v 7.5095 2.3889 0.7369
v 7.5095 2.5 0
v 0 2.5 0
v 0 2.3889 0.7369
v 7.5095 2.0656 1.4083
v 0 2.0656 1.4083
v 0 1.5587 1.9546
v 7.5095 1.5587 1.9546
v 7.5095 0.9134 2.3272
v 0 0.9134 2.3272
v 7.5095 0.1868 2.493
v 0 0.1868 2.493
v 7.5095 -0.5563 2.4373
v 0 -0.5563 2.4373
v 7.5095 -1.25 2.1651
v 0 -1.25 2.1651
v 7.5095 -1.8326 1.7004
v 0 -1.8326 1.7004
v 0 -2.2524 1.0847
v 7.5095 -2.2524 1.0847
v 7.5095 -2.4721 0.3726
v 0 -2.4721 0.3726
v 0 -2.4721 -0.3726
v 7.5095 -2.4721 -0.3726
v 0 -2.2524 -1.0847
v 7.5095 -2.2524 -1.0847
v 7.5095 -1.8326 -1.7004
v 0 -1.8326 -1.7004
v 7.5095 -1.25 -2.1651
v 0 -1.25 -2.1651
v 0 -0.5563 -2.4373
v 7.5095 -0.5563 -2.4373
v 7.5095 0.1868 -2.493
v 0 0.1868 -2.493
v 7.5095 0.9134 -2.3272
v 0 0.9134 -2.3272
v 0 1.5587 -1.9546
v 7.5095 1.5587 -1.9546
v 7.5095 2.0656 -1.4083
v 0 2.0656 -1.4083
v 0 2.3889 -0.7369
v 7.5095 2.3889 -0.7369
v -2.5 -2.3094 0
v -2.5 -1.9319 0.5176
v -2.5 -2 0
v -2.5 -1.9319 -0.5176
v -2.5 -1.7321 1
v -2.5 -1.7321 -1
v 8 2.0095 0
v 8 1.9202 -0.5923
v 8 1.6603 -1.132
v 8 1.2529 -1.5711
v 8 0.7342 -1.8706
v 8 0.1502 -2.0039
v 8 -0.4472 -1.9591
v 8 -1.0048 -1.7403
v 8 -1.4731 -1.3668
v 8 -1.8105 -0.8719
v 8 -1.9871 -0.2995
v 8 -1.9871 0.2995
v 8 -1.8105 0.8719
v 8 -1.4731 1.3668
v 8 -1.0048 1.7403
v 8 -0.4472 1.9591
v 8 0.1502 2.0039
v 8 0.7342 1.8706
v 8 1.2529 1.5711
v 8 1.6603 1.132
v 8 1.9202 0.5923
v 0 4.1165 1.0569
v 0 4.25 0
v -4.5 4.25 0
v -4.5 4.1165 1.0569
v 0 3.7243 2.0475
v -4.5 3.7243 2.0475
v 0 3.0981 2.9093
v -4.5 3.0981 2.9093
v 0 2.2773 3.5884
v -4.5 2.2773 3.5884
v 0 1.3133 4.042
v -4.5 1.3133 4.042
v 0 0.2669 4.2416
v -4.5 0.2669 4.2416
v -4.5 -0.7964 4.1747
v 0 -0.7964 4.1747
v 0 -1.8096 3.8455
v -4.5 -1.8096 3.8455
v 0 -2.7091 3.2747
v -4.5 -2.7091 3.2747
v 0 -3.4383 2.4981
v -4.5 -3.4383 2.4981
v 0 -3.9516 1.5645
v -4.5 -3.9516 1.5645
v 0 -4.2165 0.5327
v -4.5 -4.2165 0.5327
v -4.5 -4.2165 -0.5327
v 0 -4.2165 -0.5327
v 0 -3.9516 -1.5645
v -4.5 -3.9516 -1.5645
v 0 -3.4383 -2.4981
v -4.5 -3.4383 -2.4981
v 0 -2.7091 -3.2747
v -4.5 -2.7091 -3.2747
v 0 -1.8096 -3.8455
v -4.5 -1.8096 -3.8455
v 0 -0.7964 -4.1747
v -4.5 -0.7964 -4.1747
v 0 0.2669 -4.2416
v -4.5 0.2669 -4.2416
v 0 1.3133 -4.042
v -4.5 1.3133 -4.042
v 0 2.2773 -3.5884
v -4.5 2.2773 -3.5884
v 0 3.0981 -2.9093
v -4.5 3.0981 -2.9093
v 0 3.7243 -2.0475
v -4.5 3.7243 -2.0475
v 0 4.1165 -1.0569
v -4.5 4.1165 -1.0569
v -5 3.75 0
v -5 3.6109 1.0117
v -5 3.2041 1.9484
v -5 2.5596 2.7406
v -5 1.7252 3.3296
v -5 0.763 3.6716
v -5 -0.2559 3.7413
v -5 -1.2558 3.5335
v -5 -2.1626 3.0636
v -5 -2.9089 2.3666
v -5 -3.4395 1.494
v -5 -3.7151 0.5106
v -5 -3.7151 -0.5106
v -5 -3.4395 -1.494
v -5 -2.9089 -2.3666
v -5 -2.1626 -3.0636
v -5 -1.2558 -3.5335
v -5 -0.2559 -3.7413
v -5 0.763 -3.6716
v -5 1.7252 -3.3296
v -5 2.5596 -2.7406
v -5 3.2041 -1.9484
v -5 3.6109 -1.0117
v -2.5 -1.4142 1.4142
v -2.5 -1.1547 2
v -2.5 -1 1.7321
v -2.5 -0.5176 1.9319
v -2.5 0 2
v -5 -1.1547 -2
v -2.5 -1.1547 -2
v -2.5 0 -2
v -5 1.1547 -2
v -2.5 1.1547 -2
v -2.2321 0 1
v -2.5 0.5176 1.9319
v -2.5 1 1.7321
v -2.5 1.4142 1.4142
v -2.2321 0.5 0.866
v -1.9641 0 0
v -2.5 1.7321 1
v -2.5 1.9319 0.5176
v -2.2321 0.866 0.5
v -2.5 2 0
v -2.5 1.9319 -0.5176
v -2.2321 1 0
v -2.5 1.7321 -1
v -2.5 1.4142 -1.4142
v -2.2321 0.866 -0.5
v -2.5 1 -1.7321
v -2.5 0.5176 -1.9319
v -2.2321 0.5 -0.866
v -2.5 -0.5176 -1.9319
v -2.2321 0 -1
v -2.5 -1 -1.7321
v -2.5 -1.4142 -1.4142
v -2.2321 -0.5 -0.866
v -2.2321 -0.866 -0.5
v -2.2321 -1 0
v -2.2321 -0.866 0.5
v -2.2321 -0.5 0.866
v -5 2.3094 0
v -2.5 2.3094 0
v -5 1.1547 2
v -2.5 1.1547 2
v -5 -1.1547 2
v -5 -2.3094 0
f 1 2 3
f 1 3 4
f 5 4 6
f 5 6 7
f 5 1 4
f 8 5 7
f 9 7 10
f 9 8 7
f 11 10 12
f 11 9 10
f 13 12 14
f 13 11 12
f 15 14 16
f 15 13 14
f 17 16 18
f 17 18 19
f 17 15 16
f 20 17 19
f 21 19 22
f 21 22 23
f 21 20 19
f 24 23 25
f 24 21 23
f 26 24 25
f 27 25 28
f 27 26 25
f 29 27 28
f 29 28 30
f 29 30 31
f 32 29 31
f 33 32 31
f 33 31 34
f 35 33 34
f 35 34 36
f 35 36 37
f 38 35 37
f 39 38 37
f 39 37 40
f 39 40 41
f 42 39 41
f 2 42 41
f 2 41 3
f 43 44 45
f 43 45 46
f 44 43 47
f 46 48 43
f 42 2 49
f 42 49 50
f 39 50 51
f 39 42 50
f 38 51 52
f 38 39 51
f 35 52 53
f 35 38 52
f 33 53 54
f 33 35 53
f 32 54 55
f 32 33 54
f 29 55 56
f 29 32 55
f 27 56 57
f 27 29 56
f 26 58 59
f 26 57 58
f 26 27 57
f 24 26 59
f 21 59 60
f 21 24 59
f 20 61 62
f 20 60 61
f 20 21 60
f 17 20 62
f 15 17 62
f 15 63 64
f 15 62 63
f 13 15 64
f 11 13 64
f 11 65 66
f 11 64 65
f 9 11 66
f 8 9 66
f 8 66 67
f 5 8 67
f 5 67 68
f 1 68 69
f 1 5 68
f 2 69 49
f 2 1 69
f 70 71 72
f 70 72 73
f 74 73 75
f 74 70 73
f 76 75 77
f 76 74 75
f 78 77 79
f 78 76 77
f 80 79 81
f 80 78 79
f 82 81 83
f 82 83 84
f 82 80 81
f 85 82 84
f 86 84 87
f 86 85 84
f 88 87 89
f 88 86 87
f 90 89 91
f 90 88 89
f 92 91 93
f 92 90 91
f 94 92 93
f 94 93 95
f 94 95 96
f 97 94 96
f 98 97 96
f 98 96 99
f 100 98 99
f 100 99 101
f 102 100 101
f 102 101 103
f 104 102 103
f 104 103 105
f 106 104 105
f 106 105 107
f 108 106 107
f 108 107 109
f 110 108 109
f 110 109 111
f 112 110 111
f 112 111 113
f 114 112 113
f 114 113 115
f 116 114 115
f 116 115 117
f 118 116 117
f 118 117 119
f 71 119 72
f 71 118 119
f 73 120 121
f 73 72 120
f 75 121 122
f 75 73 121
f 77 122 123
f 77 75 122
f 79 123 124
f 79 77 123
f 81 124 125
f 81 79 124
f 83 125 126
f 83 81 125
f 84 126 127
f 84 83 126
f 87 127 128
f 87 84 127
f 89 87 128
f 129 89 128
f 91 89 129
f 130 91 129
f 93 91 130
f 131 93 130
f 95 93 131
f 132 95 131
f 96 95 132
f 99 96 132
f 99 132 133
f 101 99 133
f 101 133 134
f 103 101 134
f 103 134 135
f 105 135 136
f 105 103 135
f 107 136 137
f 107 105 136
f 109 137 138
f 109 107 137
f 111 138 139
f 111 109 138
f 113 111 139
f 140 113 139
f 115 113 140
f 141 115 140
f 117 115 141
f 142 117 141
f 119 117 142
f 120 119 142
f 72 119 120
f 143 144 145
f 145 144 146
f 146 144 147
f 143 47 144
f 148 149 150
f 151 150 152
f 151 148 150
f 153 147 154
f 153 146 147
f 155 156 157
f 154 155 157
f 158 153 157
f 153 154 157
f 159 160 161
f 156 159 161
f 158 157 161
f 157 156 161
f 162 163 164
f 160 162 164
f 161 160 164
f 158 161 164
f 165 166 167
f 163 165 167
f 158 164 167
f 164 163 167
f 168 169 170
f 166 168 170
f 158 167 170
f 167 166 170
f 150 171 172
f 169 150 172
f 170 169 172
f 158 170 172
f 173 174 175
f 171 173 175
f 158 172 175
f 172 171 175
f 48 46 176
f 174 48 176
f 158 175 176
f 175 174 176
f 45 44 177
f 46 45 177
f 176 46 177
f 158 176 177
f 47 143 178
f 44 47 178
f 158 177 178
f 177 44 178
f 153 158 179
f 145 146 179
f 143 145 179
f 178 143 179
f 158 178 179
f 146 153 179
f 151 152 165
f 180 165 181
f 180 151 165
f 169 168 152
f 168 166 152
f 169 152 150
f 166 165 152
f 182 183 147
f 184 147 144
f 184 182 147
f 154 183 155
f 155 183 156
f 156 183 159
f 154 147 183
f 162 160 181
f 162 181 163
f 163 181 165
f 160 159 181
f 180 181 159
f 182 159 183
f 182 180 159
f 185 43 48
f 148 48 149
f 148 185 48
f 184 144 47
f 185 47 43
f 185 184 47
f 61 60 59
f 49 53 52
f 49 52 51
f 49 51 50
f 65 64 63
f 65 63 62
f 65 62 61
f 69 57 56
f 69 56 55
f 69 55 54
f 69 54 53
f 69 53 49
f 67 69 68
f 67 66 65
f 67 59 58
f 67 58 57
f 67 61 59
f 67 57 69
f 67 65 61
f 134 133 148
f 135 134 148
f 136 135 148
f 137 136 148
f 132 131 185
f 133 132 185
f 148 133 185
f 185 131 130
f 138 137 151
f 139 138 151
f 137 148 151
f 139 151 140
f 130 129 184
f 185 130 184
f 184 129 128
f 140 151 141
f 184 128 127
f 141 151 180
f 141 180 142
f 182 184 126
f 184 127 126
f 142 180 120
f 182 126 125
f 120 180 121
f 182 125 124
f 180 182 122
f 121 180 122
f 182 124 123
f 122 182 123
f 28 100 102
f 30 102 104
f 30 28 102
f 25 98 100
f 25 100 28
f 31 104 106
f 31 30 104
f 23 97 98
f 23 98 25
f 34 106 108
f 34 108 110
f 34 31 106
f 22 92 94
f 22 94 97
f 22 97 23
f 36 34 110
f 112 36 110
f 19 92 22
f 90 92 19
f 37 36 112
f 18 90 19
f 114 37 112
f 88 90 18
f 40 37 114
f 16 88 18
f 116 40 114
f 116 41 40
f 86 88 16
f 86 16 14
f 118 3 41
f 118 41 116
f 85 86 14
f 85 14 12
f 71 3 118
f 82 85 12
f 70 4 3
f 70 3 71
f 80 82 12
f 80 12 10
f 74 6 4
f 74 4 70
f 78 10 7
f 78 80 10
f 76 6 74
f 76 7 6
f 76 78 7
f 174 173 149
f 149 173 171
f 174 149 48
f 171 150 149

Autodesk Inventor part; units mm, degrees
sketch "Sketch_1" plane through (0, 0, 0) normal (0, 0, 1) x (1, 0, 0)
  line L0 (8, 0) -> (-5, 0)
  line L1 (-5, 0) -> (-5, 3.75)
  line L2 (-5, 3.75) -> (-4.5, 4.25)
  line L3 (-4.5, 4.25) -> (0, 4.25)
  line L4 (0, 4.25) -> (0, 2.5)
  line L5 (0, 2.5) -> (7.5095, 2.5)
  line L6 (7.5095, 2.5) -> (8, 2.0095)
  line L7 (8, 2.0095) -> (8, 0)
  line L8 (8, 0) -> (-5, 0)
revolve "Revolution1" add sketch "Sketch_1" angle 360 about axis through (8, 0, 0) along (1, 0, 0)
thread "Thread1" size "M5x0.8" class "6g" standard "ISO Metric profile" length 6.5095
sketch "Sketch2" plane through (-5, 0, 0) normal (-1, 0, 0) x (0, 0, 1)
  point P0 (0, 0)
hole "Hole1" at (-5, 0, 0) direction (1, 0, 0) diameter 4 depth 2.5 tip angle 150
sketch "Sketch_3" plane through (-5, 0, 0) normal (1, 0, 0) x (0, 0, -1)
  line L0 (-2, -1.1547) -> (0, -2.3094)
  line L1 (0, -2.3094) -> (2, -1.1547)
  line L2 (2, -1.1547) -> (2, 1.1547)
  line L3 (2, 1.1547) -> (0, 2.3094)
  line L4 (0, 2.3094) -> (-2, 1.1547)
  line L5 (-2, 1.1547) -> (-2, -1.1547)
extrude "Extrusion1" cut sketch "Sketch_3" along normal blind 2.5
ref_plane "bolt_to_nut_XY" through (8, 0, 0) normal (1, 0, 0) x (0, 0, -1)
ref_plane "bolt_to_nut_YZ" through (8, 0, 0) normal (0, 0, -1) x (0, 1, 0)
ref_plane "bolt_to_nut_ZX" through (8, 0, 0) normal (0, 1, 0) x (1, 0, 0)
ref_plane "screw1_XY" through (0, 0, 0) normal (1, 0, 0) x (0, 0, -1)
ref_plane "screw1_YZ" through (0, 0, 0) normal (0, 0, -1) x (0, 1, 0)
ref_plane "screw1_ZX" through (0, 0, 0) normal (0, 1, 0) x (1, 0, 0)
properties part number "CB5-8" material "鋼、炭素鋼"
